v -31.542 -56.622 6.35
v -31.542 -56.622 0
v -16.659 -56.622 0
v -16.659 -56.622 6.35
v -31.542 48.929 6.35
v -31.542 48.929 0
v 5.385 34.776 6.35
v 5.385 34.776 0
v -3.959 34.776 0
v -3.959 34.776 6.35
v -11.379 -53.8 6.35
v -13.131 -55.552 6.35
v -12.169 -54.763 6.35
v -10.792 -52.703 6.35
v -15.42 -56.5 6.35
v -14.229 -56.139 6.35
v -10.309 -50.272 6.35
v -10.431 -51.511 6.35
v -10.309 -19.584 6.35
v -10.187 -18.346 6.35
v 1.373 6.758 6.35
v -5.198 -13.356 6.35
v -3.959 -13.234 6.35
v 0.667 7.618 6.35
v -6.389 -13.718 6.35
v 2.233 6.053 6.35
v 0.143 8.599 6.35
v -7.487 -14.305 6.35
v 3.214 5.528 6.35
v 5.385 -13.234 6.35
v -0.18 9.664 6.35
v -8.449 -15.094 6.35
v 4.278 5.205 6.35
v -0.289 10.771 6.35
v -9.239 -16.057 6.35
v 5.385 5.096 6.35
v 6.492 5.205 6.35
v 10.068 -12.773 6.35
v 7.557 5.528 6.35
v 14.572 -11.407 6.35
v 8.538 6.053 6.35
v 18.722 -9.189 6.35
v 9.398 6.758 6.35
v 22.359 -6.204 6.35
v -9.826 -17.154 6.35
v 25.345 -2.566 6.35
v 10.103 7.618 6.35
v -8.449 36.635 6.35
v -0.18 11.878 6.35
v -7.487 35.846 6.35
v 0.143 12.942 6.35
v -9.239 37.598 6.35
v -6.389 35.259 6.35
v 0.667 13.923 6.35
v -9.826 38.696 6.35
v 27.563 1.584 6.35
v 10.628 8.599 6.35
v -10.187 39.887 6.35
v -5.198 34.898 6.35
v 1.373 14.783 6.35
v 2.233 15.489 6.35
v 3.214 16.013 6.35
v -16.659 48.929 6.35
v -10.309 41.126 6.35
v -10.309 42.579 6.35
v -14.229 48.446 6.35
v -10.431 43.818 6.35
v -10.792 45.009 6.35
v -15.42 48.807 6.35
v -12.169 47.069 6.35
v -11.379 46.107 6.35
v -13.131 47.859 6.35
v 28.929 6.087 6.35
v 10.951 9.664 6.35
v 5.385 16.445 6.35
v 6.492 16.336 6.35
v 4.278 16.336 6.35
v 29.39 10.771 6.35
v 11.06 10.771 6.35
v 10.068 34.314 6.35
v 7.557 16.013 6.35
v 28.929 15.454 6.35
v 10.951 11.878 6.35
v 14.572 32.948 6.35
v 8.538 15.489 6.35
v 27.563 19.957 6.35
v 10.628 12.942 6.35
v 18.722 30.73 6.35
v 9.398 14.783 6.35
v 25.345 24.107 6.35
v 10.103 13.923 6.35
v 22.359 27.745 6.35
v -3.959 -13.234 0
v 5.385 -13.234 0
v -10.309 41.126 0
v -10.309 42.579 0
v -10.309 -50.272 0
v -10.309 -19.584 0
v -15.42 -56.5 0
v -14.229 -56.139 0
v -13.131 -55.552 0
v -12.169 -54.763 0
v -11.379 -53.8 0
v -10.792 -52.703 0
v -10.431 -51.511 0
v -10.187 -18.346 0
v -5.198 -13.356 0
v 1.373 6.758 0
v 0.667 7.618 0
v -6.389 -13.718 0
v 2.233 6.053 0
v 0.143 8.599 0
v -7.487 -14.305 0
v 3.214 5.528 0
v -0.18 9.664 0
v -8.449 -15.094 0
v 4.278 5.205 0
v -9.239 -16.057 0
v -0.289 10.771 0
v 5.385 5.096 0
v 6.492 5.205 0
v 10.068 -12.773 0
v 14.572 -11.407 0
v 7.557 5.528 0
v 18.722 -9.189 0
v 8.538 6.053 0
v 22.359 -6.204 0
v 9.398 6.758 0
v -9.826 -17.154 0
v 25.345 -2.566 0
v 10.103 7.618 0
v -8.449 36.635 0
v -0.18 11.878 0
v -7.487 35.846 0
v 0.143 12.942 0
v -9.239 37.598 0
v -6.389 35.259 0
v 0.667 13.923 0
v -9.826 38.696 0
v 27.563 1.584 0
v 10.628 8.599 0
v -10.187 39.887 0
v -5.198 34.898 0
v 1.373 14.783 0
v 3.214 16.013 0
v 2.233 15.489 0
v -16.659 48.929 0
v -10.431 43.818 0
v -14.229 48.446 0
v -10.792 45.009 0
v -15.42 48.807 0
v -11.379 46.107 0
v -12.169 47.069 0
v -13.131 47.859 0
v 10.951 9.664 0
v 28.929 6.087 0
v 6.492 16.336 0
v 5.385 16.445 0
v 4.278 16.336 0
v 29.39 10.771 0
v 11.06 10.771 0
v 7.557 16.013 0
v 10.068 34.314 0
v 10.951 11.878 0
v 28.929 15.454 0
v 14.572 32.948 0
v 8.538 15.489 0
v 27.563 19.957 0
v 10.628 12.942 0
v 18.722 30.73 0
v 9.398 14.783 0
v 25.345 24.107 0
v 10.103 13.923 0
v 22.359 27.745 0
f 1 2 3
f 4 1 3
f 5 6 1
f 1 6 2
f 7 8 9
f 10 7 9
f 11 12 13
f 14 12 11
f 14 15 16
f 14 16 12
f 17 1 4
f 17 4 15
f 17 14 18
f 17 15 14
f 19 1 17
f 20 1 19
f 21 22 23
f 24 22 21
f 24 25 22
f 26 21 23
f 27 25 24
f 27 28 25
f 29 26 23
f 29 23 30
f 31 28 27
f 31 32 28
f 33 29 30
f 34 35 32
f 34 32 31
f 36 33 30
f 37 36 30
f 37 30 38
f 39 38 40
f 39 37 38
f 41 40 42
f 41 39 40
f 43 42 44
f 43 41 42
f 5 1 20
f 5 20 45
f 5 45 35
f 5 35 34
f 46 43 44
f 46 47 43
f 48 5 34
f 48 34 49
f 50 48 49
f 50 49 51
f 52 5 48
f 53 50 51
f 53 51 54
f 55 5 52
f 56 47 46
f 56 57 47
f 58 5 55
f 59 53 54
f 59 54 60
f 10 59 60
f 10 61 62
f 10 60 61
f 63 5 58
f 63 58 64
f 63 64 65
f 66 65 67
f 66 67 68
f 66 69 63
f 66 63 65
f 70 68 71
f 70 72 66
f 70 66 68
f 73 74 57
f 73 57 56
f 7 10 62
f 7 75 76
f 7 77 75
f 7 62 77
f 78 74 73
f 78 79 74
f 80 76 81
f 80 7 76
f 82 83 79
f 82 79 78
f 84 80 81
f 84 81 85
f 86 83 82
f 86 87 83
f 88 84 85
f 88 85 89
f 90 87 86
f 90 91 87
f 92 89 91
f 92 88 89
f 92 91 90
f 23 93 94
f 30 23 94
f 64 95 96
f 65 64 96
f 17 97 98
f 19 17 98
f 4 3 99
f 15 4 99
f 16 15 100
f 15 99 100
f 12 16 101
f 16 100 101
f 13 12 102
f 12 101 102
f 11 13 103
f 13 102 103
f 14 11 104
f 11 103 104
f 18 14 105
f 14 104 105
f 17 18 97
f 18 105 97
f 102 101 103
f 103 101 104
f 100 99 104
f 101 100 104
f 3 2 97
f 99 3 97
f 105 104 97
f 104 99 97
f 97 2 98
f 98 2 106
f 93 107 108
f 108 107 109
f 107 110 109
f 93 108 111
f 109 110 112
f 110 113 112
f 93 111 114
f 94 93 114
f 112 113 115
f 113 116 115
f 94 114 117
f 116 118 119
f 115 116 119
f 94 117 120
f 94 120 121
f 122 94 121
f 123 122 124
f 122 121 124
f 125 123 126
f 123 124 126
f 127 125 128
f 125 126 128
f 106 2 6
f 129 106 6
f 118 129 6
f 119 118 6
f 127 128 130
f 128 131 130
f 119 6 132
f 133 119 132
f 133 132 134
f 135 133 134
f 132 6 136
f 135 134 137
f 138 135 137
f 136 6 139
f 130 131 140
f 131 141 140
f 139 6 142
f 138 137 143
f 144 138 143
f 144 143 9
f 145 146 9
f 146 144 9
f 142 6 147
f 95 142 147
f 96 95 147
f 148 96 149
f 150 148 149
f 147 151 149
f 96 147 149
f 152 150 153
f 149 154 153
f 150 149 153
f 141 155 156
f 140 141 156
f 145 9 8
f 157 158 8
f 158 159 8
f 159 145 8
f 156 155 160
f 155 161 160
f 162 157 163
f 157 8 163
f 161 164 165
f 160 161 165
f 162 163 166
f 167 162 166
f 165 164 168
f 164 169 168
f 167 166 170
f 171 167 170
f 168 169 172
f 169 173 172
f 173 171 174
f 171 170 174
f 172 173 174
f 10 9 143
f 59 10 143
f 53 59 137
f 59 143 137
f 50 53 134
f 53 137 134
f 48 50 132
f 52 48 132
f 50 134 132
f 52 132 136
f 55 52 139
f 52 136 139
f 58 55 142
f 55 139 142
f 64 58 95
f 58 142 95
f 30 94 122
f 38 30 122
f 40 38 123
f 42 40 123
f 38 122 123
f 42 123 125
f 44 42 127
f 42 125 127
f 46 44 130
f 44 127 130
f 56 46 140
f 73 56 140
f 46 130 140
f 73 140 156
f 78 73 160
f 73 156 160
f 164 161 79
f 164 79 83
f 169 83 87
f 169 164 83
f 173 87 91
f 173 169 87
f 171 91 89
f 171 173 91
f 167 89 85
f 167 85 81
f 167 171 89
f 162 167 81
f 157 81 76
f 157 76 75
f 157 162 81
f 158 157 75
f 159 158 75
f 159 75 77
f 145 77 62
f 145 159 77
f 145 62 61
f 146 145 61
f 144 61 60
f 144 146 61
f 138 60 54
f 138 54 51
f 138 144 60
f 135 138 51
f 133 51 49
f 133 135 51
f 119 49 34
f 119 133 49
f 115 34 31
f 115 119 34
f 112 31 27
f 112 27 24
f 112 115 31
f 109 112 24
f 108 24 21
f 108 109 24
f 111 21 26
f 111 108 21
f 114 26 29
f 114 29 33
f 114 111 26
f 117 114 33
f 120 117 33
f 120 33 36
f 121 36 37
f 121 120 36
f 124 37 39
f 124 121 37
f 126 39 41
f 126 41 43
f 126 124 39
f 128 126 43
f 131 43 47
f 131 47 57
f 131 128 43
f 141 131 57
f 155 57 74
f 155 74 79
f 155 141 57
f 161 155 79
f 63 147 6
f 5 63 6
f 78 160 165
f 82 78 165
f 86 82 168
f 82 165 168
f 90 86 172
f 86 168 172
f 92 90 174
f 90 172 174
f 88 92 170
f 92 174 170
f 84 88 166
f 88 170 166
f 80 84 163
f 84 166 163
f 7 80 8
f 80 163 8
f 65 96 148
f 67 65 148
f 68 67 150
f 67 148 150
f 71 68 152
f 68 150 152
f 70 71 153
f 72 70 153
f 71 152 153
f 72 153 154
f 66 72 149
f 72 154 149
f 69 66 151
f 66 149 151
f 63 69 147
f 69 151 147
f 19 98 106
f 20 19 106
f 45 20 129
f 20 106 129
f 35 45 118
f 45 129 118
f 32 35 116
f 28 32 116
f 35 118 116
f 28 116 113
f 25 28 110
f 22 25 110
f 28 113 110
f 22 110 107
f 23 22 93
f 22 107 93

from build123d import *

# Parameters (mm, degrees)
F0_R     = 5.674275
F1_DEPTH = 6.35


with BuildPart() as f1:
    # F0 (on Top) → F1 (new body)
    with BuildSketch(Plane.XY):
        with BuildLine():
            ThreePointArc((29.390265, 10.770578), (22.359371, 27.744657), (5.385291, 34.775551))
            ThreePointArc((5.385291, 34.775551), (-18.619682, 10.770578), (5.385291, -13.234396))
            ThreePointArc((5.385291, -13.234396), (22.359371, -6.203502), (29.390265, 10.770578))
        make_face()
        with Locations((5.385291, 10.770578)):
            Circle(F0_R, mode=Mode.SUBTRACT)
        with BuildLine():
            Line((-16.658982, 48.929192), (-31.542405, 48.929192))
            Line((-31.542405, 48.929192), (-31.542405, -56.622464))
            Line((-31.542405, -56.622464), (-16.658982, -56.622464))
            ThreePointArc((-16.658982, -56.622464), (-12.168854, -54.762592), (-10.308982, -50.272464))
            Line((-10.308982, -50.272464), (-10.308982, -19.584396))
            ThreePointArc((-10.308982, -19.584396), (-8.44911, -15.094267), (-3.958982, -13.234396))
            Line((-3.958982, -13.234396), (5.385291, -13.234396))
            ThreePointArc((5.385291, -13.234396), (-18.619682, 10.770578), (5.385291, 34.775551))
            Line((5.385291, 34.775551), (-3.958982, 34.775551))
            ThreePointArc((-3.958982, 34.775551), (-8.44911, 36.635423), (-10.308982, 41.125551))
            Line((-10.308982, 41.125551), (-10.308982, 42.579192))
            ThreePointArc((-10.308982, 42.579192), (-12.168854, 47.06932), (-16.658982, 48.929192))
        make_face()
    extrude(amount=F1_DEPTH)


solid = f1.part
